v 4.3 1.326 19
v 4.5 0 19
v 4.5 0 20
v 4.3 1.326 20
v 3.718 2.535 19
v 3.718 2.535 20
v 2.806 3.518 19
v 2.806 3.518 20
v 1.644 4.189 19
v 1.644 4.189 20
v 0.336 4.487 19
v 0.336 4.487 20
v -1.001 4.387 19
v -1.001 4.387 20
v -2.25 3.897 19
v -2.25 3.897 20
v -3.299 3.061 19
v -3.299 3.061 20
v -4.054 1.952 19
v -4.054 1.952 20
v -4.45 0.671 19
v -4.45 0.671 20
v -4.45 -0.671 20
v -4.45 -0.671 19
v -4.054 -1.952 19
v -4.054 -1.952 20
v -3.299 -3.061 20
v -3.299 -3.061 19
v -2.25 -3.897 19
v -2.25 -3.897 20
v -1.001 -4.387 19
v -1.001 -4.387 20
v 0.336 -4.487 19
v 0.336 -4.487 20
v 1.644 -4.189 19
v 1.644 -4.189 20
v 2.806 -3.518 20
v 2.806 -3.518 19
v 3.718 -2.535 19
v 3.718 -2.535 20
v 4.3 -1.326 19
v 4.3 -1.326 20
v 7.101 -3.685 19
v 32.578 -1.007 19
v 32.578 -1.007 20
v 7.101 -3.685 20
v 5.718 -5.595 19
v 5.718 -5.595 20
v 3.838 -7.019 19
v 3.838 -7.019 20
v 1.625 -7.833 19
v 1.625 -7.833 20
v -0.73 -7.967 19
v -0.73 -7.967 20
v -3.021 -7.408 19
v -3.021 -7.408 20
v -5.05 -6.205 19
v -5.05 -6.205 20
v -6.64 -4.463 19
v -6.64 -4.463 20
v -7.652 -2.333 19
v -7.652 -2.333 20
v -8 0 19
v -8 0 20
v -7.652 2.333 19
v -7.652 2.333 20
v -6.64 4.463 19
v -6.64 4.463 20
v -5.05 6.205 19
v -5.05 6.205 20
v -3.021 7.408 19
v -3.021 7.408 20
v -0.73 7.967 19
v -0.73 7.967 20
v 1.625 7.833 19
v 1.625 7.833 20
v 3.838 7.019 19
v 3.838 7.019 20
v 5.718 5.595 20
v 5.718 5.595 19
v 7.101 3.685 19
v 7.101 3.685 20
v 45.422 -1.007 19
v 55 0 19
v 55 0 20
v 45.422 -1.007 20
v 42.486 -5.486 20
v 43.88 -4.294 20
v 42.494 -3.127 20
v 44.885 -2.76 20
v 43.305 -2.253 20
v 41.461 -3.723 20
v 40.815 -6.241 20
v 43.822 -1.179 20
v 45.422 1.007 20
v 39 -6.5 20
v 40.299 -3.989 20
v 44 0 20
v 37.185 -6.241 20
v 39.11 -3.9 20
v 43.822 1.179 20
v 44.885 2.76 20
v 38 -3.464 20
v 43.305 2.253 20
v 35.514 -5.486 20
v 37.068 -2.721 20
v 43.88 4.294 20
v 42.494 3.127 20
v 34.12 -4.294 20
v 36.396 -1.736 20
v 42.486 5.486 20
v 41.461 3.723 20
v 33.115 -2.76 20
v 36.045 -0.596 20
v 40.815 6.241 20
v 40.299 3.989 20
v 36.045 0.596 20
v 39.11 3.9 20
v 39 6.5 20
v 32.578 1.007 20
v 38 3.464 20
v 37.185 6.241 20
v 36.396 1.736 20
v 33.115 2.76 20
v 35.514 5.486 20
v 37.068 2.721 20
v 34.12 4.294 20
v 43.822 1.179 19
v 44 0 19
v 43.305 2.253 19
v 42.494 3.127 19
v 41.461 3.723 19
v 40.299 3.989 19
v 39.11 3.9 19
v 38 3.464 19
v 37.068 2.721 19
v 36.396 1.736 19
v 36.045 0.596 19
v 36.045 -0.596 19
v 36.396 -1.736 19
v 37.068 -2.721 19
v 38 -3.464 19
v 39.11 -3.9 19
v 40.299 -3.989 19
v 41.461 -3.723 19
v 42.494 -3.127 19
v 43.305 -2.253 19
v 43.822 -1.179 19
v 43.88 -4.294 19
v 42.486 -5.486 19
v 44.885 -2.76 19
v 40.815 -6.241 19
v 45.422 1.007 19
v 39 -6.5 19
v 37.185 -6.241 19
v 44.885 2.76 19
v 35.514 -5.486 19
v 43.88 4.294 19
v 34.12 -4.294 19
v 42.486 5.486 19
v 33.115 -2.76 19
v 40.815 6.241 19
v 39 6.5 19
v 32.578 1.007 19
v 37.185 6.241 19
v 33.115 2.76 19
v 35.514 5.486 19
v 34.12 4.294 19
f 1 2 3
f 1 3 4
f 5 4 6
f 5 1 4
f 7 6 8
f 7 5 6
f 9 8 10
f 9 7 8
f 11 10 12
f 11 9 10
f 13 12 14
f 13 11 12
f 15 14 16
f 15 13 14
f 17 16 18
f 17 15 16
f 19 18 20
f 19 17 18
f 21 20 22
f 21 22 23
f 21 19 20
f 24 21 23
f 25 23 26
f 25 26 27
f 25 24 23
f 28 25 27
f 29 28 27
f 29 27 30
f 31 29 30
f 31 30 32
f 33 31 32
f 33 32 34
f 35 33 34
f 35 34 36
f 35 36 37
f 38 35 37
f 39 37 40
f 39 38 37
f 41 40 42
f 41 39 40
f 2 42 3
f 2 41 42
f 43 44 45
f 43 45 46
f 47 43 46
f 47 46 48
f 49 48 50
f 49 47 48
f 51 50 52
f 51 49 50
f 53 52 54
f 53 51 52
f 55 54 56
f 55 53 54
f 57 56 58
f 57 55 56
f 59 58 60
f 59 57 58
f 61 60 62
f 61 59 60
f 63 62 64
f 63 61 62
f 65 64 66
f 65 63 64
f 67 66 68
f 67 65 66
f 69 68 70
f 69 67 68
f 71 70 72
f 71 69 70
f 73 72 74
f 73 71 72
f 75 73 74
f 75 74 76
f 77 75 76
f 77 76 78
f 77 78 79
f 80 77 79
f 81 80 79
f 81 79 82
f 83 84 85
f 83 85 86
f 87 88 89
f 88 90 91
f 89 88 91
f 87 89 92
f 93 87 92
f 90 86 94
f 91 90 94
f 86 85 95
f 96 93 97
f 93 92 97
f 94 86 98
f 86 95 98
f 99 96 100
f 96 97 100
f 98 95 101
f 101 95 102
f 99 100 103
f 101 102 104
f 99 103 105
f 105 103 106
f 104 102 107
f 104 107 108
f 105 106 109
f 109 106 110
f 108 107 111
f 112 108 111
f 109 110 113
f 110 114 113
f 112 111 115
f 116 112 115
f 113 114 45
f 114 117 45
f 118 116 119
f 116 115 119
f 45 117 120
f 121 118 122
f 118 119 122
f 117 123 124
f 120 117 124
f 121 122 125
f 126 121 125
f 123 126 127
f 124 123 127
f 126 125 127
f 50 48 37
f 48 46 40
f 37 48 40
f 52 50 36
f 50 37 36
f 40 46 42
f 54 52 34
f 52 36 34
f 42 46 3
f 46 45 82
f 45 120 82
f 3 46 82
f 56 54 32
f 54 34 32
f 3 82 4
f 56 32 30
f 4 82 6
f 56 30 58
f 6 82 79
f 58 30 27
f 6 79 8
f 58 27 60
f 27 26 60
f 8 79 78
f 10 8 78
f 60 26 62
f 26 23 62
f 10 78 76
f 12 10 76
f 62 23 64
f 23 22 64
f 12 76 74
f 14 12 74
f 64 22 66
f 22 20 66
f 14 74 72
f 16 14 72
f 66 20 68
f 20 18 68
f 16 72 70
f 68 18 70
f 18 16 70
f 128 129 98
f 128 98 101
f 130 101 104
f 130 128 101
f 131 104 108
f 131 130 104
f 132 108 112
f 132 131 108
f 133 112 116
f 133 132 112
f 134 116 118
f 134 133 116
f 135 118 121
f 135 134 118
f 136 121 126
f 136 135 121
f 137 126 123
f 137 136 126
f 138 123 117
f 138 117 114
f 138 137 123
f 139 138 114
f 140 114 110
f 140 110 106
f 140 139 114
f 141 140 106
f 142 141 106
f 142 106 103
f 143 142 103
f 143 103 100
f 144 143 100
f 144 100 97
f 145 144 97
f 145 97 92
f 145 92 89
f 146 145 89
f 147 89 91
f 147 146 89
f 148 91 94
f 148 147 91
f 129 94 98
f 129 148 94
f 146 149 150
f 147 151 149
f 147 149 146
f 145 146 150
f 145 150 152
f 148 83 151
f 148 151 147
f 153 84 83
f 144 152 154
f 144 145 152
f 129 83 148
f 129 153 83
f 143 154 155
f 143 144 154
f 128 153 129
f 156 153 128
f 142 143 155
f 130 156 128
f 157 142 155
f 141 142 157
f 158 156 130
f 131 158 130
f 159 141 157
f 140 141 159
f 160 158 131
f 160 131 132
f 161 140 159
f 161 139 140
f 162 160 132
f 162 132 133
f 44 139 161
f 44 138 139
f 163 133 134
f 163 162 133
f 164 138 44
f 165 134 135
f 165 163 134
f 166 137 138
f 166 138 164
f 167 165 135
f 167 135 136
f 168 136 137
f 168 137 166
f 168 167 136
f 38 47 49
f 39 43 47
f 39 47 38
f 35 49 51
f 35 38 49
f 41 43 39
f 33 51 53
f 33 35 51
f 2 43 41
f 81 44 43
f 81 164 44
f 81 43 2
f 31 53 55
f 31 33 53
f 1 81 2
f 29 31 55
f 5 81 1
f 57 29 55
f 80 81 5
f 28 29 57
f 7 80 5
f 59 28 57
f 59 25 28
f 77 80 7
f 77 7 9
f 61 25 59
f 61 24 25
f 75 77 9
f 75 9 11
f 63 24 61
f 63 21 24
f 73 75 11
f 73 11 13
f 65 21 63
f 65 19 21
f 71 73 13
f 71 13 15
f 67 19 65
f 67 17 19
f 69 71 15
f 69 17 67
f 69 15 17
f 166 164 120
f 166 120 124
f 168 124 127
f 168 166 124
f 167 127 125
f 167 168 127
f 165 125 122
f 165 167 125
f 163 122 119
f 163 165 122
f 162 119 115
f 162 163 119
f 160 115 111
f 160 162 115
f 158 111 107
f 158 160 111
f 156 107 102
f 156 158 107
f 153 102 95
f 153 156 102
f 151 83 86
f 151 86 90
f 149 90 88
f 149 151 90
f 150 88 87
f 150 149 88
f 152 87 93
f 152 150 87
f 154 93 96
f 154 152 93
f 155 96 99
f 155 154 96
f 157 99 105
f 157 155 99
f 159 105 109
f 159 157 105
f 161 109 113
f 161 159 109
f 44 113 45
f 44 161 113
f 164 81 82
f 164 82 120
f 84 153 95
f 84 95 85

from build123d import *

# Parameters (mm, degrees)
BOSS_EXTRUDE1_START = 19
SKETCH2_R           = 4.5
SKETCH2_R_2         = 4
BOSS_EXTRUDE1_DEPTH = 1


with BuildPart() as part:
    # Sketch2 → Boss-Extrude1 (new body)
    with BuildSketch(Plane.XY.offset(BOSS_EXTRUDE1_START)):
        with BuildLine():
            Line((55, 0), (45.421564163, -1.006734174))
            ThreePointArc((45.421564163, -1.006734174), (39, -6.5), (32.578435837, -1.006734174))
            Line((32.578435837, -1.006734174), (7.101007974, -3.684519746))
            ThreePointArc((7.101007974, -3.684519746), (-8, 0), (7.101007974, 3.684519746))
            Line((7.101007974, 3.684519746), (32.578435837, 1.006734174))
            ThreePointArc((32.578435837, 1.006734174), (39, 6.5), (45.421564163, 1.006734174))
            Line((45.421564163, 1.006734174), (55, 0))
        make_face()
        Circle(SKETCH2_R, mode=Mode.SUBTRACT)
        with Locations((40, 0)):
            Circle(SKETCH2_R_2, mode=Mode.SUBTRACT)
    extrude(amount=BOSS_EXTRUDE1_DEPTH)


solid = part.part
